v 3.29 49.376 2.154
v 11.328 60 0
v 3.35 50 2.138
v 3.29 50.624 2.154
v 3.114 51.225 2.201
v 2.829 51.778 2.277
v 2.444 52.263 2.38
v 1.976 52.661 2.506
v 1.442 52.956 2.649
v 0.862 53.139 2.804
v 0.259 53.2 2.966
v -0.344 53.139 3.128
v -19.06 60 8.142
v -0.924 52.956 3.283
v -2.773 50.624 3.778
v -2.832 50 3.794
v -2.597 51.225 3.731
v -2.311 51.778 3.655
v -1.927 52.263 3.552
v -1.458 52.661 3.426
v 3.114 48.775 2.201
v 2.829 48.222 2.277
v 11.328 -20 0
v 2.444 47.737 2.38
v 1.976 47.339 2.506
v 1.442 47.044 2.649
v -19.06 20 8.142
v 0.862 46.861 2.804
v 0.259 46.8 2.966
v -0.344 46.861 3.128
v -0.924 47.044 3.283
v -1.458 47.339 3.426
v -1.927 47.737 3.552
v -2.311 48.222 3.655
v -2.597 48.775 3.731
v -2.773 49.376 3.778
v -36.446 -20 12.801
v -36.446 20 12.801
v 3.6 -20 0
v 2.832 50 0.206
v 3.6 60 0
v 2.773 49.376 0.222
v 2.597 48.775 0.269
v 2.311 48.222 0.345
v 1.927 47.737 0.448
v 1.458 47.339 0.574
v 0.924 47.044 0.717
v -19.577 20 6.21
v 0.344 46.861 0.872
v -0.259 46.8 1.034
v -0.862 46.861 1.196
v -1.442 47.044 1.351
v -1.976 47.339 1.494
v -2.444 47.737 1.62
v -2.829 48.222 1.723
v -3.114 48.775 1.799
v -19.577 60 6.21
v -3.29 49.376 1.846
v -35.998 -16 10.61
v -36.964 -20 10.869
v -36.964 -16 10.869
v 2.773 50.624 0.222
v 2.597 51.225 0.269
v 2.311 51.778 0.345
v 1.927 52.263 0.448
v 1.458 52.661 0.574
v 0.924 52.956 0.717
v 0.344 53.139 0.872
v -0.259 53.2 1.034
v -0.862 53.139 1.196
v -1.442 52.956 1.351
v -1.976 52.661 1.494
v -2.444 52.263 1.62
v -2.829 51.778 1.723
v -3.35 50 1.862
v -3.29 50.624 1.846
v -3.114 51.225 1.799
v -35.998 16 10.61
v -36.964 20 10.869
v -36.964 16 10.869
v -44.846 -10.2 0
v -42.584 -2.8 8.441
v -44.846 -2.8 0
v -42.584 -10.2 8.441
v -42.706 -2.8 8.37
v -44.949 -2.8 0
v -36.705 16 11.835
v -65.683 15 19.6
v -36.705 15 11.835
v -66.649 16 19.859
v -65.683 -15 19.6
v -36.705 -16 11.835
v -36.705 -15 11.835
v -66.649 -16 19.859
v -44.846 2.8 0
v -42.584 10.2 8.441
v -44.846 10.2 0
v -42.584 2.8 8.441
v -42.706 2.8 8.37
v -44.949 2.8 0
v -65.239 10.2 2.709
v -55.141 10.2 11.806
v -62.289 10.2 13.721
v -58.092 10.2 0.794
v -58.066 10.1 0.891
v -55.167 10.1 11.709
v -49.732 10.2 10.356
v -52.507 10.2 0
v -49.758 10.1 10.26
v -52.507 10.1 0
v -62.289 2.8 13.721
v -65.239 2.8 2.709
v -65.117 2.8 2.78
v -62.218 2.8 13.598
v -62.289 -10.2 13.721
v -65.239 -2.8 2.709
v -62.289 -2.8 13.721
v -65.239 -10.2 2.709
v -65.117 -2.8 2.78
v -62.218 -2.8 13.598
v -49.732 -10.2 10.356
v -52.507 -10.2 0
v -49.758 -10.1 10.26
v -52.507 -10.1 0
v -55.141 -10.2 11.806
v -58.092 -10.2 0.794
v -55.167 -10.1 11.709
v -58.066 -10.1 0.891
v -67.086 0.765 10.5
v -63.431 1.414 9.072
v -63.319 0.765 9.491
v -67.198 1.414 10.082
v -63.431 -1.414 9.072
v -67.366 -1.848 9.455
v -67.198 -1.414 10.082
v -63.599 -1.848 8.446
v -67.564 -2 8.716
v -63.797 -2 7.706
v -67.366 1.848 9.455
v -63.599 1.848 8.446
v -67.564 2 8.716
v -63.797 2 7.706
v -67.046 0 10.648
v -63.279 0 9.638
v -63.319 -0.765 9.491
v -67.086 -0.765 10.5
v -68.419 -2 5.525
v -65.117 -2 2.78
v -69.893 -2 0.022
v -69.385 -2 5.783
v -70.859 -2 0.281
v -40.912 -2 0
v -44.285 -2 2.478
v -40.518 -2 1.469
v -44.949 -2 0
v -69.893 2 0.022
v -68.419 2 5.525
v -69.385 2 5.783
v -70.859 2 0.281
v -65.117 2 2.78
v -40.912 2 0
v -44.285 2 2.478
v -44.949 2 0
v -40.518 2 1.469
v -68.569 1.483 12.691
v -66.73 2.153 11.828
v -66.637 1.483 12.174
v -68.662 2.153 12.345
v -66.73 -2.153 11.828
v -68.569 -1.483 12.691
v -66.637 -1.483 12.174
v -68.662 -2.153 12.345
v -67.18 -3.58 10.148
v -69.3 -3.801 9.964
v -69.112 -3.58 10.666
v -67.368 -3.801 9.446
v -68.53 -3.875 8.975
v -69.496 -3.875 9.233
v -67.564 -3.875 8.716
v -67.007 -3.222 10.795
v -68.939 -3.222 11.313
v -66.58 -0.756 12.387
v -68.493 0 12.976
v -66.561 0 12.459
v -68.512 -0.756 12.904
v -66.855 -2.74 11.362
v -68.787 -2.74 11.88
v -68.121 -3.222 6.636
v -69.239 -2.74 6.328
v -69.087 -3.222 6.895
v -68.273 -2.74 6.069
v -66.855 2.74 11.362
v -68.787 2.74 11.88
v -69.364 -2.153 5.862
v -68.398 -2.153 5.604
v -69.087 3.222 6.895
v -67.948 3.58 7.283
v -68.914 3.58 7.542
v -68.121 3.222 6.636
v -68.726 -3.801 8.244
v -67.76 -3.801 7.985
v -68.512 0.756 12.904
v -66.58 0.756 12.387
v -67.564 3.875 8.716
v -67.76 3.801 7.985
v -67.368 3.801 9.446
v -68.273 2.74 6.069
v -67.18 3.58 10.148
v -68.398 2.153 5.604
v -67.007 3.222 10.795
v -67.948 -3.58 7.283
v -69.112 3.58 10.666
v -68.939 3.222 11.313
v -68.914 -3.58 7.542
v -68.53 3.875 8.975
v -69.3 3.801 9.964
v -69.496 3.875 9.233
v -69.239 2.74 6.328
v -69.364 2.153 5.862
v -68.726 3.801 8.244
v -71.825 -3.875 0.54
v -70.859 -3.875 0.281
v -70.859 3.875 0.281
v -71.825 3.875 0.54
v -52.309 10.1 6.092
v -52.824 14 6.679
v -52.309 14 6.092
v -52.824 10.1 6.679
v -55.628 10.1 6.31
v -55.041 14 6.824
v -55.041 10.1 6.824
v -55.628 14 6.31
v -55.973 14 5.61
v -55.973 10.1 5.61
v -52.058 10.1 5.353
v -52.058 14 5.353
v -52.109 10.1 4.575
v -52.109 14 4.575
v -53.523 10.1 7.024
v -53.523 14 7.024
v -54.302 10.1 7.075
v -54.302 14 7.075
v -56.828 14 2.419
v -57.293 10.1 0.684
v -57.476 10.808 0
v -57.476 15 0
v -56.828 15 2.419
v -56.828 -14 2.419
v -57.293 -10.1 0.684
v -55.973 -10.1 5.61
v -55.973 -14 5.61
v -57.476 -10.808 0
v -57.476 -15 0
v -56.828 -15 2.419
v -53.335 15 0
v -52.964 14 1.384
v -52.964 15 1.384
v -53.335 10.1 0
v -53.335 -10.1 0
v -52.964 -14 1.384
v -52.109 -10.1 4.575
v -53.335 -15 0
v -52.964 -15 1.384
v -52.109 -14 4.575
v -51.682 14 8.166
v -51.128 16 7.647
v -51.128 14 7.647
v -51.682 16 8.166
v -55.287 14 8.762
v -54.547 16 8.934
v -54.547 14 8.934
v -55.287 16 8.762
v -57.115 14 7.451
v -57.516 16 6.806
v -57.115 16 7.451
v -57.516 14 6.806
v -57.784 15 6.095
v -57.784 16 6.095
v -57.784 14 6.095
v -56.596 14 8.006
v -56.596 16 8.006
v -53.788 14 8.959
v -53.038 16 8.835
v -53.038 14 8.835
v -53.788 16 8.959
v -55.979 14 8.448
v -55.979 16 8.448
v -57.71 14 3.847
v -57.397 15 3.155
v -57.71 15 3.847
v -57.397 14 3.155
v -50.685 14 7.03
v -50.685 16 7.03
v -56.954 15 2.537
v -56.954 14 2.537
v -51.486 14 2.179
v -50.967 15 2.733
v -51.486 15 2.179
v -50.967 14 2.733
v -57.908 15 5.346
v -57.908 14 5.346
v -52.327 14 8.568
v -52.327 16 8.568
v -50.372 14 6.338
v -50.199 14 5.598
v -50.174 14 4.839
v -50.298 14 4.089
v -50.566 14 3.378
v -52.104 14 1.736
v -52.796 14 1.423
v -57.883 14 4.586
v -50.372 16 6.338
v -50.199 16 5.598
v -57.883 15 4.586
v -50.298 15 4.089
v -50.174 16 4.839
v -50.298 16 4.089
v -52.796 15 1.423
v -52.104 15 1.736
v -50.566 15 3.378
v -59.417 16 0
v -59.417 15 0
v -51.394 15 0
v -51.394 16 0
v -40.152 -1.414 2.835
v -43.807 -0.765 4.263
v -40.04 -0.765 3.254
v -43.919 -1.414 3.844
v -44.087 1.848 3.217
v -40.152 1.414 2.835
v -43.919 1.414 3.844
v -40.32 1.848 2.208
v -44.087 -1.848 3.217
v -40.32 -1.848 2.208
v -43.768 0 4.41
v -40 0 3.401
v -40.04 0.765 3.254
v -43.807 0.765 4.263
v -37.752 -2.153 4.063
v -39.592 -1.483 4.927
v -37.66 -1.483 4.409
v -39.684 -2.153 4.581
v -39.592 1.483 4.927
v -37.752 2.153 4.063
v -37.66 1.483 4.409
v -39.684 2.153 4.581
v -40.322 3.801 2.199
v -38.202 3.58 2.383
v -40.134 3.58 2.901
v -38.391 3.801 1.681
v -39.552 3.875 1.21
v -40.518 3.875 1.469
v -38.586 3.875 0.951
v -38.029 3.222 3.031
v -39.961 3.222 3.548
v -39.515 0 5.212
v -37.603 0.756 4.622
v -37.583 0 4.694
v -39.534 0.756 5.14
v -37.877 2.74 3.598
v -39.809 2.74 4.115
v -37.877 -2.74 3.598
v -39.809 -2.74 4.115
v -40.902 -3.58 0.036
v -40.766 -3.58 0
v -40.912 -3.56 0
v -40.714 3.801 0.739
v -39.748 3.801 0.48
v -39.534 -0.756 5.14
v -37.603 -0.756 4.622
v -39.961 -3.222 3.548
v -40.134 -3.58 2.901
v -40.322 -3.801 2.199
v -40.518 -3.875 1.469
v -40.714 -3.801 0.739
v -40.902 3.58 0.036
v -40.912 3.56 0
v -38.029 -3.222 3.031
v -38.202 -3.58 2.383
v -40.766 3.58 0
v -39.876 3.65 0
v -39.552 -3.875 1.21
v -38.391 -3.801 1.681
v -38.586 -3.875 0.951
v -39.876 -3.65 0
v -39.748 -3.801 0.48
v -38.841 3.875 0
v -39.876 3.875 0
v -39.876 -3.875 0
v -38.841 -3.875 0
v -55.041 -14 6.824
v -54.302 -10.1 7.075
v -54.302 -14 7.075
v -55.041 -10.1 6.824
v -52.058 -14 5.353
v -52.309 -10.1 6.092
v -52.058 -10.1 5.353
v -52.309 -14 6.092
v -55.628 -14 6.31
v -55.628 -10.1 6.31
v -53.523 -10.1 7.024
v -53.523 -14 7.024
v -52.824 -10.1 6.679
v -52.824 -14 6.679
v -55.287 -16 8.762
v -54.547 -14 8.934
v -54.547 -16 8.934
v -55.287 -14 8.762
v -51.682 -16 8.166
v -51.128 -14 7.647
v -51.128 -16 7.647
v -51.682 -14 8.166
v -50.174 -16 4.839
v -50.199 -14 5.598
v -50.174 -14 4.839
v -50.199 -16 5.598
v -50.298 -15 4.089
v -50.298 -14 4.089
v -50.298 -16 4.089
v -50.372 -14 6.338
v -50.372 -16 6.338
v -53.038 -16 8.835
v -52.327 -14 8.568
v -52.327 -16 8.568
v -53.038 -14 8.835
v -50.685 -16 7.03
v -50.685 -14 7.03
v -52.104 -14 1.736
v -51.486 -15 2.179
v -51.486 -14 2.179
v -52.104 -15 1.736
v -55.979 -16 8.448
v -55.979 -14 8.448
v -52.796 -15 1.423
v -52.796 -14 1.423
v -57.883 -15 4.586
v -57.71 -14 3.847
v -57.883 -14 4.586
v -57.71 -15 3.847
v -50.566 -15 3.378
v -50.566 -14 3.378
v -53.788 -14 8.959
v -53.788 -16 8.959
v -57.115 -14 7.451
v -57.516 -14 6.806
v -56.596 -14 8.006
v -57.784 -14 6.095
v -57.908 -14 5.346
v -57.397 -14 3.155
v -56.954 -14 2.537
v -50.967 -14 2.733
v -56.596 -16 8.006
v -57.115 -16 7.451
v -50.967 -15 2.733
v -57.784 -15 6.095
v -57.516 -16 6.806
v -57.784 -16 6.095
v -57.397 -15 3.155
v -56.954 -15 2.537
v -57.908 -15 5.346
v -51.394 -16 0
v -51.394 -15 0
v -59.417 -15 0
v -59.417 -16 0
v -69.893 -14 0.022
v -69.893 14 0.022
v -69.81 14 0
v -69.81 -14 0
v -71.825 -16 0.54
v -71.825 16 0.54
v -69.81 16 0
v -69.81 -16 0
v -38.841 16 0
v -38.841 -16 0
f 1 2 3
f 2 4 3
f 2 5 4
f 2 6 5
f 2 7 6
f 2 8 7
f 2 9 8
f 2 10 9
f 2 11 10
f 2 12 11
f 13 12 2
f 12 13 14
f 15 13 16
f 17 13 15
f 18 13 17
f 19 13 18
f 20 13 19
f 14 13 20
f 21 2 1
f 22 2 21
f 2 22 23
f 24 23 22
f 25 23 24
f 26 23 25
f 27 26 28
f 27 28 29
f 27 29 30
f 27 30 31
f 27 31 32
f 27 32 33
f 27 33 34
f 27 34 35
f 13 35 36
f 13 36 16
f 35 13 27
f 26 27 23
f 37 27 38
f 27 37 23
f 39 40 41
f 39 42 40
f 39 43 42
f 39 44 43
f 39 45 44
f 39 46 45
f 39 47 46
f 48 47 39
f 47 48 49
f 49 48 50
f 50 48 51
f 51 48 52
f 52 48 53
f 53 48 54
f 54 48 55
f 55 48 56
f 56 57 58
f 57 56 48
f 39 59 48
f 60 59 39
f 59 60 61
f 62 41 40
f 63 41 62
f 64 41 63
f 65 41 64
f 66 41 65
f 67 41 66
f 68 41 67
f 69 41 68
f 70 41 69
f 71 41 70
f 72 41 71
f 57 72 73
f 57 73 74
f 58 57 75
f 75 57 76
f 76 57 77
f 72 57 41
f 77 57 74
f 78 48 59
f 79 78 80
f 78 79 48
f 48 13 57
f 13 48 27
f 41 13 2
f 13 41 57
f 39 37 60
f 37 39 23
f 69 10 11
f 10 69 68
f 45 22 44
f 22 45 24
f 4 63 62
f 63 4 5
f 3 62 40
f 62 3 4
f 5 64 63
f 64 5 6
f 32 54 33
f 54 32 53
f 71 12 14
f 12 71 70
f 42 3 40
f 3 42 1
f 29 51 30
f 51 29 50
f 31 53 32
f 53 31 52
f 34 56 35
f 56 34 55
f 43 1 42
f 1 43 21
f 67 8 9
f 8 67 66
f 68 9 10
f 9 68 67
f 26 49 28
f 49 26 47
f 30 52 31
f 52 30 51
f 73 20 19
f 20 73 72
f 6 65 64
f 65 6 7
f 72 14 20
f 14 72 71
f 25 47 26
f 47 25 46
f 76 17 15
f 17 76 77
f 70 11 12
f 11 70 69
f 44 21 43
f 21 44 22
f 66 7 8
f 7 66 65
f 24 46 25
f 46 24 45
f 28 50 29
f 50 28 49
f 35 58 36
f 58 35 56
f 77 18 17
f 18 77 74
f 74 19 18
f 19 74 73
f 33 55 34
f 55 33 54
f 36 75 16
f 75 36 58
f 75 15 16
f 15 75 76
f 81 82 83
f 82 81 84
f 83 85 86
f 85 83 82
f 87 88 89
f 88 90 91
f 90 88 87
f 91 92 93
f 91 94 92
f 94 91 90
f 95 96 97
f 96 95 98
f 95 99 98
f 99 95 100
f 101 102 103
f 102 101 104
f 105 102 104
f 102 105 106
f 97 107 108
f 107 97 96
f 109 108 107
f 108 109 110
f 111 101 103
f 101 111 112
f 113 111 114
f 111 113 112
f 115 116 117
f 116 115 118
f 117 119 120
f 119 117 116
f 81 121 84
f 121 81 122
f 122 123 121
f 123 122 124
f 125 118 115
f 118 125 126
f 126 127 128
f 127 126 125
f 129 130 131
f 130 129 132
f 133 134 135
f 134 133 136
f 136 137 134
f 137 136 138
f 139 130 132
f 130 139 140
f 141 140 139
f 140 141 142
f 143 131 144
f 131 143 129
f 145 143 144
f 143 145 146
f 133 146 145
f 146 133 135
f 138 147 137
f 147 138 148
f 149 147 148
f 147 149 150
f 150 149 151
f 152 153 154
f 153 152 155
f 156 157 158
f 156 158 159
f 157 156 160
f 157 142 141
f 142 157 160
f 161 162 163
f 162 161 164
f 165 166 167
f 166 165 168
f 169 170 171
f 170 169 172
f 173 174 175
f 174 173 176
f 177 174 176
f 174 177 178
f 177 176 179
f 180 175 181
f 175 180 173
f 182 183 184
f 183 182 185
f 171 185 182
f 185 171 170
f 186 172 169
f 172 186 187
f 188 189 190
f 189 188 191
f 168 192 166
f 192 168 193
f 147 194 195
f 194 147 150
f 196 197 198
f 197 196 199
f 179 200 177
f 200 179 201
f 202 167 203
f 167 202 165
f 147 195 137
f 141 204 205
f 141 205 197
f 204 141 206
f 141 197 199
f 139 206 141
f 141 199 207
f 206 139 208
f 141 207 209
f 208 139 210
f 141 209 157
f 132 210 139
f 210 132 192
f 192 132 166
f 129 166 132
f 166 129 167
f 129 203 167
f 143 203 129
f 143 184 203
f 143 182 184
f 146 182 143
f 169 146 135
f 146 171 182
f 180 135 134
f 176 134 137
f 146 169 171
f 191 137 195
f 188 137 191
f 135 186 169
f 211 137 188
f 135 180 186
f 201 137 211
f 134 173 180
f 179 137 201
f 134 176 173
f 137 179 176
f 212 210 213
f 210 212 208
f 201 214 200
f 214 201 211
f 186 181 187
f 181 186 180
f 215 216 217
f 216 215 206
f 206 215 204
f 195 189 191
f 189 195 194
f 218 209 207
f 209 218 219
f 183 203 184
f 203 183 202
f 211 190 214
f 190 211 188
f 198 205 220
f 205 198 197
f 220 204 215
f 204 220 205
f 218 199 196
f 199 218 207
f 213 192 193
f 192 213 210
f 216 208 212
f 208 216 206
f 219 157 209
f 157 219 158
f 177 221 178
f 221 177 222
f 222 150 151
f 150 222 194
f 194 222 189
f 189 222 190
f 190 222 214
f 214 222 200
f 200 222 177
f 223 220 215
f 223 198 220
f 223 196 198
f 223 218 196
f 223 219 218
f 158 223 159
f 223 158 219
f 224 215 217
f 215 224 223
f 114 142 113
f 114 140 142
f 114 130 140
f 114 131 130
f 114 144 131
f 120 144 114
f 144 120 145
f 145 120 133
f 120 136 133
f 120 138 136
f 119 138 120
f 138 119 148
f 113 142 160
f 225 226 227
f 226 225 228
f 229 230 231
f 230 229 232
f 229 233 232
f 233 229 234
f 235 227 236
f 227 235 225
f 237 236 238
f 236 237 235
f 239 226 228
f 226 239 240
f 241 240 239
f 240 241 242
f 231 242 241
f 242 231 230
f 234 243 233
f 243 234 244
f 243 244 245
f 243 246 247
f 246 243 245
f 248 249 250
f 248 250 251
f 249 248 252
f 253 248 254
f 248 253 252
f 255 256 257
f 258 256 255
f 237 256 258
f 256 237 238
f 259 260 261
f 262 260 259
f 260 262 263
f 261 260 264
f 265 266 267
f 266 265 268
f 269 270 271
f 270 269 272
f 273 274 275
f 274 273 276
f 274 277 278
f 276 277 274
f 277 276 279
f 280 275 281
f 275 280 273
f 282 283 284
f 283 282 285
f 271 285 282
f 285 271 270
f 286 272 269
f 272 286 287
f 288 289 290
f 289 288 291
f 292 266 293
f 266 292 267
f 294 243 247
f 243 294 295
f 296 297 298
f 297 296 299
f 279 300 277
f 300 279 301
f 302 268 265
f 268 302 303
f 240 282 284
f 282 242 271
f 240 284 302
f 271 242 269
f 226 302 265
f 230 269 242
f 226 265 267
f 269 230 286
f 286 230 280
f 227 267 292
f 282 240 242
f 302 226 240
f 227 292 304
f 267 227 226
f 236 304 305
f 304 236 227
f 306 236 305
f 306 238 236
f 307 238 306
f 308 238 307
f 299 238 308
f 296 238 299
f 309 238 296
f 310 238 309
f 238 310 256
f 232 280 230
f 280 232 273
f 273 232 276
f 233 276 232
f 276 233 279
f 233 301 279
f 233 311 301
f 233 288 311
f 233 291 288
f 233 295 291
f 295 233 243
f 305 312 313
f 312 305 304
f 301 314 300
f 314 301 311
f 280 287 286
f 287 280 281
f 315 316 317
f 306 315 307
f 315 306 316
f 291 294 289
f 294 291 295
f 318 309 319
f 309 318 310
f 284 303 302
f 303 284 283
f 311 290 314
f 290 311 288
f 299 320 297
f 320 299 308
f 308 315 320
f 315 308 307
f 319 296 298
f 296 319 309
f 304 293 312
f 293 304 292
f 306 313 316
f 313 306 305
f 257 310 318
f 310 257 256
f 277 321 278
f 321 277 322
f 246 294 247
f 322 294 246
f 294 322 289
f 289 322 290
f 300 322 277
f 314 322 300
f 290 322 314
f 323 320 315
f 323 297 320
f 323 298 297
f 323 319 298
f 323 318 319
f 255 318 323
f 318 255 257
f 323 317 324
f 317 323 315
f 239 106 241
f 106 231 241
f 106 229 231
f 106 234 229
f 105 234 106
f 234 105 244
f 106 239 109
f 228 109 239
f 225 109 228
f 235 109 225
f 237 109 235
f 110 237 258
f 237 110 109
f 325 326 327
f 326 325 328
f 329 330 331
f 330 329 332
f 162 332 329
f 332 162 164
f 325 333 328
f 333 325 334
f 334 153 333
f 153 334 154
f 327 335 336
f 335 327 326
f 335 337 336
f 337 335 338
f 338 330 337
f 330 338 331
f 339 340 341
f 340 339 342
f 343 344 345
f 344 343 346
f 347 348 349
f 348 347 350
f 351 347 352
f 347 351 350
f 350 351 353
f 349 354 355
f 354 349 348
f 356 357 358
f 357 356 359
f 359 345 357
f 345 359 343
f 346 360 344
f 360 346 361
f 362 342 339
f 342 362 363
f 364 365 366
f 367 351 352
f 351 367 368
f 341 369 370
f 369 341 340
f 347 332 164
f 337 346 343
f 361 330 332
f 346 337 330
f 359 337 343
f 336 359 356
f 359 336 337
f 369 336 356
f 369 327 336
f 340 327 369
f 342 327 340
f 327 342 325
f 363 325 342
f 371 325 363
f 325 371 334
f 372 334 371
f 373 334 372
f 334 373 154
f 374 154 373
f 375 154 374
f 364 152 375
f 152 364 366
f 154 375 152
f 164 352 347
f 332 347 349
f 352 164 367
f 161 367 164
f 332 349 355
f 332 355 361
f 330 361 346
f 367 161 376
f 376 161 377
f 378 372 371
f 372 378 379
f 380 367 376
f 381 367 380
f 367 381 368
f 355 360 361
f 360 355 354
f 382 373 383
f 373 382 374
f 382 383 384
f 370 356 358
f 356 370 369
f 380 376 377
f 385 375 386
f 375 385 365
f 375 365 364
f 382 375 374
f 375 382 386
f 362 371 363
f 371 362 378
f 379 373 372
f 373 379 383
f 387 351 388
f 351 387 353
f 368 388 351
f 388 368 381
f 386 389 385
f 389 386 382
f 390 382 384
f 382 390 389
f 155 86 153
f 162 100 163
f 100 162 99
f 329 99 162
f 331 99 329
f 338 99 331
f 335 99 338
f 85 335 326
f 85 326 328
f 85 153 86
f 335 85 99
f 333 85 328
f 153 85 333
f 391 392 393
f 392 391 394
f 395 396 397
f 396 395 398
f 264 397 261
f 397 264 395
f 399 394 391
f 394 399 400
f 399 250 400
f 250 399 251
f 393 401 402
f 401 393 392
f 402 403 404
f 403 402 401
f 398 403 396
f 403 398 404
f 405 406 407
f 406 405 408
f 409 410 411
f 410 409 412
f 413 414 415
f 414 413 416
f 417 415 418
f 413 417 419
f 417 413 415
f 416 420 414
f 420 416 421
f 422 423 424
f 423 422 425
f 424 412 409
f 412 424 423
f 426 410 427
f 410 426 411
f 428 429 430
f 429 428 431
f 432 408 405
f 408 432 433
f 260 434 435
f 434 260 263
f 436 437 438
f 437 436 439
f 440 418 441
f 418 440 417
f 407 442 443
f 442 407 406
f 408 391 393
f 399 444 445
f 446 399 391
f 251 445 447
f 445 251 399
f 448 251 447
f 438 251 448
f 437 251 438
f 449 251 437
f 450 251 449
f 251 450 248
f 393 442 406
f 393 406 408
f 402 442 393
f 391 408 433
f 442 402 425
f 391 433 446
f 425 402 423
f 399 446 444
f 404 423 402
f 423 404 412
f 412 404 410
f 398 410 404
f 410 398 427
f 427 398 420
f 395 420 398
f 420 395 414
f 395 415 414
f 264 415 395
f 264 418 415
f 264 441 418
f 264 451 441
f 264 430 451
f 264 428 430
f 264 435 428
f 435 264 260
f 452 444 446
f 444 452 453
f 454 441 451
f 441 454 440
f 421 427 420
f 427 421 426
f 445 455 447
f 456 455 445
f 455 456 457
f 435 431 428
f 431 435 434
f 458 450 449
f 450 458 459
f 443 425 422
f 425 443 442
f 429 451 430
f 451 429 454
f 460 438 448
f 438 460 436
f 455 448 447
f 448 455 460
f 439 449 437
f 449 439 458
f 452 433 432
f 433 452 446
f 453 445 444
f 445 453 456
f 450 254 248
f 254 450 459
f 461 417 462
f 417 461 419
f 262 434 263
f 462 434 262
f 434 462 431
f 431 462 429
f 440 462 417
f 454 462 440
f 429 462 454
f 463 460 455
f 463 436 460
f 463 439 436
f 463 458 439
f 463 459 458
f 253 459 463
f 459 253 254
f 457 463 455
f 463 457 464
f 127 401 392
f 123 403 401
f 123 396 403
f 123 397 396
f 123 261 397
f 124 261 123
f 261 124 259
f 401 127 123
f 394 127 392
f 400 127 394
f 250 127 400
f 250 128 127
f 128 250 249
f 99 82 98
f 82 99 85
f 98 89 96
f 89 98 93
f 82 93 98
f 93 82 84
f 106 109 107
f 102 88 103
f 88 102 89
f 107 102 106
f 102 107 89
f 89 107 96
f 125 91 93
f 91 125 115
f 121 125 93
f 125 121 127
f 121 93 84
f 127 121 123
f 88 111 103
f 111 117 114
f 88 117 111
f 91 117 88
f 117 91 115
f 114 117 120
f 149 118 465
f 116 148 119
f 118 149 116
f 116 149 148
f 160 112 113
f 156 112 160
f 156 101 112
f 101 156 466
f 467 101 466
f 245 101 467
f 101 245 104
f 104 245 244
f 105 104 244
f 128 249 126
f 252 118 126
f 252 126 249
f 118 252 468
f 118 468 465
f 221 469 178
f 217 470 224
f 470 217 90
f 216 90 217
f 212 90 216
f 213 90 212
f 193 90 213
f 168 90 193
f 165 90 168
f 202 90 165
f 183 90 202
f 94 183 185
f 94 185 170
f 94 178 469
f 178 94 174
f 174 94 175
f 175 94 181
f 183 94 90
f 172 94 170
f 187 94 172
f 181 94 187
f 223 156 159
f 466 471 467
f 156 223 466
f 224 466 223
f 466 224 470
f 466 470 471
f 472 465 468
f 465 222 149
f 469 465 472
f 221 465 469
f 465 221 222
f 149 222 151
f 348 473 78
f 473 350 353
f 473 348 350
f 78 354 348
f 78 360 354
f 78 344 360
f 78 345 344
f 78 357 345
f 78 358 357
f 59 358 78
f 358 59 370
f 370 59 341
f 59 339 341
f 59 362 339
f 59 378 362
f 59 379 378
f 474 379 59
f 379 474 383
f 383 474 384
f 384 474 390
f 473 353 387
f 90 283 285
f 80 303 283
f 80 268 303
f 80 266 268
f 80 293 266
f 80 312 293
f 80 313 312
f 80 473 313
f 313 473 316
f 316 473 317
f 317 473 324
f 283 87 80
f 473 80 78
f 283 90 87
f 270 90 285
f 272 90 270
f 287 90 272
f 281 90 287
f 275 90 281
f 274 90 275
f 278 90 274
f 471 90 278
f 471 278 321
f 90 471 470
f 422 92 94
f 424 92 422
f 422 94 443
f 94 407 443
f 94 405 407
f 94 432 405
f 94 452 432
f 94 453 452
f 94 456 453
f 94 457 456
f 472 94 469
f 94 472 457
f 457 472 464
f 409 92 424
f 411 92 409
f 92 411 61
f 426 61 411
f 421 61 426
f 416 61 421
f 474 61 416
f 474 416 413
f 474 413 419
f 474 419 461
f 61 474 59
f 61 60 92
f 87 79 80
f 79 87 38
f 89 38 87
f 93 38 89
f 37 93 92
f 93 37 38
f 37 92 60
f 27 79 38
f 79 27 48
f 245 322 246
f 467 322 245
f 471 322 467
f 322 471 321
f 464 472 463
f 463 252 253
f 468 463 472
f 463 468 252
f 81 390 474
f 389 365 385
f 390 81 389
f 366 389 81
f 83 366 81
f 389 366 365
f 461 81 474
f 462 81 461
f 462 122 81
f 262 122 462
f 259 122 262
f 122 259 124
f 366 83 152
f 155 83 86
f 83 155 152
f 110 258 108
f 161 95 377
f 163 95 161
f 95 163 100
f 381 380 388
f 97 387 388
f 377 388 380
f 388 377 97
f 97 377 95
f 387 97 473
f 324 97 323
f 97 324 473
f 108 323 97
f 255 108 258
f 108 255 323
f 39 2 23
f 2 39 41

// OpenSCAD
// Generated by SolidPython 1.1.3 on 2024-01-15 18:45:57


difference() {
	translate(v = [0, 0, 2]) {
		rotate(a = 15, v = [0, 1, 0]) {
			union() {
				difference() {
					translate(v = [0, 20.0000000000, 0]) {
						cube(center = true, size = [40, 80, 2]);
					}
					translate(v = [0, 50, 0]) {
						cylinder($fn = 32, center = true, h = 20, r = 3.2000000000);
					}
				}
				union() {
					translate(v = [-53, 0, -10]) {
						rotate(a = 90, v = [0, 1, 0]) {
							difference() {
								union() {
									union();
									translate(v = [-10, 0, 0]) {
										rotate(a = [0, 90.0, 0.0]) {
											translate(v = [0, 0, 10.0]) {
												cube(center = true, size = [32.0000000000, 32.0000000000, 20.0]);
											}
										}
									}
									union();
								}
								union() {
									union();
									translate(v = [-10, 0, 0]) {
										rotate(a = [0, 90.0, 0.0]) {
											translate(v = [0, 0, 10]) {
												rotate(a = -90, v = [0, -1, 0]) {
													rotate(a = 90, v = [0, 0, 1]) {
														union() {
															union();
															translate(v = [0, -10, 0]) {
																rotate(a = -90, v = [1, 0, 0]) {
																	polyhedron(convexity = 10, faces = [[0, 1, 4], [1, 5, 4], [1, 2, 5], [2, 6, 5], [2, 3, 6], [3, 7, 6], [3, 0, 7], [0, 4, 7], [3, 2, 1, 0], [4, 5, 6, 7]], points = [[-15.0000000000, 15.0000000000, 0.0000000000], [15.0000000000, 15.0000000000, 0.0000000000], [15.0000000000, -15.0000000000, 0.0000000000], [-15.0000000000, -15.0000000000, 0.0000000000], [0.0000000000, 0.0000000000, 15.0000000000], [0.0000000000, 0.0000000000, 15.0000000000], [0.0000000000, 0.0000000000, 15.0000000000], [0.0000000000, 0.0000000000, 15.0000000000]]);
																}
															}
															translate(v = [0, 1.0, 0]) {
																rotate(a = 180, v = [1, 0, 0]) {
																	translate(v = [0, -10, 0]) {
																		rotate(a = -90, v = [1, 0, 0]) {
																			polyhedron(convexity = 10, faces = [[0, 1, 4], [1, 5, 4], [1, 2, 5], [2, 6, 5], [2, 3, 6], [3, 7, 6], [3, 0, 7], [0, 4, 7], [3, 2, 1, 0], [4, 5, 6, 7]], points = [[-15.0000000000, 15.0000000000, 0.0000000000], [15.0000000000, 15.0000000000, 0.0000000000], [15.0000000000, -15.0000000000, 0.0000000000], [-15.0000000000, -15.0000000000, 0.0000000000], [0.0000000000, 0.0000000000, 15.0000000000], [0.0000000000, 0.0000000000, 15.0000000000], [0.0000000000, 0.0000000000, 15.0000000000], [0.0000000000, 0.0000000000, 15.0000000000]]);
																		}
																	}
																}
															}
															translate(v = [0, -10, 0]) {
																rotate(a = -90, v = [1, 0, 0]) {
																	union() {
																		polyhedron(convexity = 10, faces = [[0, 1, 5], [1, 6, 5], [1, 2, 6], [2, 7, 6], [2, 3, 7], [3, 8, 7], [3, 4, 8], [4, 9, 8], [4, 0, 9], [0, 5, 9], [4, 3, 2, 1, 0], [5, 6, 7, 8, 9]], points = [[-10.2, 10.2, 0.0], [-10.2, 2.8, 0.0], [-4.3999999999999995, 2.8, 0.0], [-4.3999999999999995, 0.0, 0.0], [0.0, 0.0, 0.0], [-10.2, 10.2, 20.0], [-10.2, 2.8, 20.0], [-4.3999999999999995, 2.8, 20.0], [-4.3999999999999995, 0.0, 20.0], [0.0, 0.0, 20.0]]);
																		mirror(v = [0, 1]) {
																			polyhedron(convexity = 10, faces = [[0, 1, 5], [1, 6, 5], [1, 2, 6], [2, 7, 6], [2, 3, 7], [3, 8, 7], [3, 4, 8], [4, 9, 8], [4, 0, 9], [0, 5, 9], [4, 3, 2, 1, 0], [5, 6, 7, 8, 9]], points = [[-10.2, 10.2, 0.0], [-10.2, 2.8, 0.0], [-4.3999999999999995, 2.8, 0.0], [-4.3999999999999995, 0.0, 0.0], [0.0, 0.0, 0.0], [-10.2, 10.2, 20.0], [-10.2, 2.8, 20.0], [-4.3999999999999995, 2.8, 20.0], [-4.3999999999999995, 0.0, 20.0], [0.0, 0.0, 20.0]]);
																		}
																		mirror(v = [1, 1]) {
																			union() {
																				polyhedron(convexity = 10, faces = [[0, 1, 5], [1, 6, 5], [1, 2, 6], [2, 7, 6], [2, 3, 7], [3, 8, 7], [3, 4, 8], [4, 9, 8], [4, 0, 9], [0, 5, 9], [4, 3, 2, 1, 0], [5, 6, 7, 8, 9]], points = [[-10.2, 10.2, 0.0], [-10.2, 2.8, 0.0], [-4.3999999999999995, 2.8, 0.0], [-4.3999999999999995, 0.0, 0.0], [0.0, 0.0, 0.0], [-10.2, 10.2, 20.0], [-10.2, 2.8, 20.0], [-4.3999999999999995, 2.8, 20.0], [-4.3999999999999995, 0.0, 20.0], [0.0, 0.0, 20.0]]);
																				mirror(v = [0, 1]) {
																					polyhedron(convexity = 10, faces = [[0, 1, 5], [1, 6, 5], [1, 2, 6], [2, 7, 6], [2, 3, 7], [3, 8, 7], [3, 4, 8], [4, 9, 8], [4, 0, 9], [0, 5, 9], [4, 3, 2, 1, 0], [5, 6, 7, 8, 9]], points = [[-10.2, 10.2, 0.0], [-10.2, 2.8, 0.0], [-4.3999999999999995, 2.8, 0.0], [-4.3999999999999995, 0.0, 0.0], [0.0, 0.0, 0.0], [-10.2, 10.2, 20.0], [-10.2, 2.8, 20.0], [-4.3999999999999995, 2.8, 20.0], [-4.3999999999999995, 0.0, 20.0], [0.0, 0.0, 20.0]]);
																				}
																			}
																		}
																		mirror(v = [1, -1]) {
																			union() {
																				polyhedron(convexity = 10, faces = [[0, 1, 5], [1, 6, 5], [1, 2, 6], [2, 7, 6], [2, 3, 7], [3, 8, 7], [3, 4, 8], [4, 9, 8], [4, 0, 9], [0, 5, 9], [4, 3, 2, 1, 0], [5, 6, 7, 8, 9]], points = [[-10.2, 10.2, 0.0], [-10.2, 2.8, 0.0], [-4.3999999999999995, 2.8, 0.0], [-4.3999999999999995, 0.0, 0.0], [0.0, 0.0, 0.0], [-10.2, 10.2, 20.0], [-10.2, 2.8, 20.0], [-4.3999999999999995, 2.8, 20.0], [-4.3999999999999995, 0.0, 20.0], [0.0, 0.0, 20.0]]);
																				mirror(v = [0, 1]) {
																					polyhedron(convexity = 10, faces = [[0, 1, 5], [1, 6, 5], [1, 2, 6], [2, 7, 6], [2, 3, 7], [3, 8, 7], [3, 4, 8], [4, 9, 8], [4, 0, 9], [0, 5, 9], [4, 3, 2, 1, 0], [5, 6, 7, 8, 9]], points = [[-10.2, 10.2, 0.0], [-10.2, 2.8, 0.0], [-4.3999999999999995, 2.8, 0.0], [-4.3999999999999995, 0.0, 0.0], [0.0, 0.0, 0.0], [-10.2, 10.2, 20.0], [-10.2, 2.8, 20.0], [-4.3999999999999995, 2.8, 20.0], [-4.3999999999999995, 0.0, 20.0], [0.0, 0.0, 20.0]]);
																				}
																				mirror(v = [1, 1]) {
																					union() {
																						polyhedron(convexity = 10, faces = [[0, 1, 5], [1, 6, 5], [1, 2, 6], [2, 7, 6], [2, 3, 7], [3, 8, 7], [3, 4, 8], [4, 9, 8], [4, 0, 9], [0, 5, 9], [4, 3, 2, 1, 0], [5, 6, 7, 8, 9]], points = [[-10.2, 10.2, 0.0], [-10.2, 2.8, 0.0], [-4.3999999999999995, 2.8, 0.0], [-4.3999999999999995, 0.0, 0.0], [0.0, 0.0, 0.0], [-10.2, 10.2, 20.0], [-10.2, 2.8, 20.0], [-4.3999999999999995, 2.8, 20.0], [-4.3999999999999995, 0.0, 20.0], [0.0, 0.0, 20.0]]);
																						mirror(v = [0, 1]) {
																							polyhedron(convexity = 10, faces = [[0, 1, 5], [1, 6, 5], [1, 2, 6], [2, 7, 6], [2, 3, 7], [3, 8, 7], [3, 4, 8], [4, 9, 8], [4, 0, 9], [0, 5, 9], [4, 3, 2, 1, 0], [5, 6, 7, 8, 9]], points = [[-10.2, 10.2, 0.0], [-10.2, 2.8, 0.0], [-4.3999999999999995, 2.8, 0.0], [-4.3999999999999995, 0.0, 0.0], [0.0, 0.0, 0.0], [-10.2, 10.2, 20.0], [-10.2, 2.8, 20.0], [-4.3999999999999995, 2.8, 20.0], [-4.3999999999999995, 0.0, 20.0], [0.0, 0.0, 20.0]]);
																						}
																					}
																				}
																			}
																		}
																	}
																}
															}
															union() {
																union();
																translate(v = [0, 1.0, 0]) {
																	rotate(a = 180, v = [1, 0, 0]) {
																		rotate(a = 180, v = [0, 1, 0]) {
																			union() {
																				translate(v = [0, 0, 14]) {
																					cylinder($fn = 32, h = 4, r = 3.8750000000);
																				}
																				translate(v = [-3.8750000000, -12, 15]) {
																					cube(size = [7.7500000000, 12, 4]);
																				}
																				union() {
																					cylinder($fn = 16, h = 19, r = 2.0000000000);
																					translate(v = [-2.0000000000, -12, 0]) {
																						cube(size = [4, 12, 19]);
																					}
																				}
																				rotate(a = -90, v = [0, 1, 0]) {
																					polyhedron(convexity = 10, faces = [[0, 1, 3], [1, 4, 3], [1, 2, 4], [2, 5, 4], [2, 0, 5], [0, 3, 5], [2, 1, 0], [3, 4, 5]], points = [[0.0000000000, -10.0000000000, 0.0000000000], [10.1000000000, -10.0000000000, 10.1000000000], [10.1000000000, -10.0000000000, -10.1000000000], [0.0000000000, 12.0000000000, 0.0000000000], [10.1000000000, 12.0000000000, 10.1000000000], [10.1000000000, 12.0000000000, -10.1000000000]]);
																				}
																			}
																		}
																	}
																}
																translate(v = [0, 1.0, 0]) {
																	rotate(a = 180, v = [1, 0, 0]) {
																		rotate(a = 90, v = [0, 1, 0]) {
																			union() {
																				translate(v = [0, 0, 14]) {
																					cylinder($fn = 32, h = 4, r = 3.8750000000);
																				}
																				translate(v = [-3.8750000000, -12, 15]) {
																					cube(size = [7.7500000000, 12, 4]);
																				}
																				union() {
																					cylinder($fn = 16, h = 19, r = 2.0000000000);
																					translate(v = [-2.0000000000, -12, 0]) {
																						cube(size = [4, 12, 19]);
																					}
																				}
																				rotate(a = -90, v = [0, 1, 0]) {
																					polyhedron(convexity = 10, faces = [[0, 1, 3], [1, 4, 3], [1, 2, 4], [2, 5, 4], [2, 0, 5], [0, 3, 5], [2, 1, 0], [3, 4, 5]], points = [[0.0000000000, -10.0000000000, 0.0000000000], [10.1000000000, -10.0000000000, 10.1000000000], [10.1000000000, -10.0000000000, -10.1000000000], [0.0000000000, 12.0000000000, 0.0000000000], [10.1000000000, 12.0000000000, 10.1000000000], [10.1000000000, 12.0000000000, -10.1000000000]]);
																				}
																			}
																		}
																	}
																}
																translate(v = [0, 1.0, 0]) {
																	rotate(a = 180, v = [1, 0, 0]) {
																		union() {
																			translate(v = [0, 0, 14]) {
																				cylinder($fn = 32, h = 4, r = 3.8750000000);
																			}
																			translate(v = [-3.8750000000, -12, 15]) {
																				cube(size = [7.7500000000, 12, 4]);
																			}
																			union() {
																				cylinder($fn = 16, h = 19, r = 2.0000000000);
																				translate(v = [-2.0000000000, -12, 0]) {
																					cube(size = [4, 12, 19]);
																				}
																			}
																			rotate(a = -90, v = [0, 1, 0]) {
																				polyhedron(convexity = 10, faces = [[0, 1, 3], [1, 4, 3], [1, 2, 4], [2, 5, 4], [2, 0, 5], [0, 3, 5], [2, 1, 0], [3, 4, 5]], points = [[0.0000000000, -10.0000000000, 0.0000000000], [10.1000000000, -10.0000000000, 10.1000000000], [10.1000000000, -10.0000000000, -10.1000000000], [0.0000000000, 12.0000000000, 0.0000000000], [10.1000000000, 12.0000000000, 10.1000000000], [10.1000000000, 12.0000000000, -10.1000000000]]);
																			}
																		}
																	}
																}
																translate(v = [0, 1.0, 0]) {
																	rotate(a = 180, v = [1, 0, 0]) {
																		rotate(a = 270, v = [0, 1, 0]) {
																			union() {
																				translate(v = [0, 0, 14]) {
																					cylinder($fn = 32, h = 4, r = 3.8750000000);
																				}
																				translate(v = [-3.8750000000, -12, 15]) {
																					cube(size = [7.7500000000, 12, 4]);
																				}
																				union() {
																					cylinder($fn = 16, h = 19, r = 2.0000000000);
																					translate(v = [-2.0000000000, -12, 0]) {
																						cube(size = [4, 12, 19]);
																					}
																				}
																				rotate(a = -90, v = [0, 1, 0]) {
																					polyhedron(convexity = 10, faces = [[0, 1, 3], [1, 4, 3], [1, 2, 4], [2, 5, 4], [2, 0, 5], [0, 3, 5], [2, 1, 0], [3, 4, 5]], points = [[0.0000000000, -10.0000000000, 0.0000000000], [10.1000000000, -10.0000000000, 10.1000000000], [10.1000000000, -10.0000000000, -10.1000000000], [0.0000000000, 12.0000000000, 0.0000000000], [10.1000000000, 12.0000000000, 10.1000000000], [10.1000000000, 12.0000000000, -10.1000000000]]);
																				}
																			}
																		}
																	}
																}
															}
														}
													}
												}
											}
										}
									}
								}
							}
						}
					}
					translate(v = [-28.0000000000, 0, 0]) {
						cube(center = true, size = [20, 40, 2]);
					}
				}
			}
		}
	}
	translate(v = [0, 0, -150]) {
		cube(center = true, size = [300, 300, 300]);
	}
}
/***********************************************
*********      SolidPython code:      **********
************************************************
 
#! /usr/bin/env python3
import sys
from math import cos, radians, sin, pi, tau
from pathlib import Path

from solid import *
from solid.utils import *

from typing import Set, Sequence, List, Callable, Optional, Union, Iterable, Tuple

import numpy as np

import extrusion_fittings as ef

class CameraMount():
	def __init__(self,camera_size = 40,screw_dia = 6.4, mount_thick = 2):
		self.camera_size = camera_size
		self.screw_dia = screw_dia
		self.mount_thick = mount_thick

	def screws(self) -> OpenSCADObject:
		screw = cylinder(r=self.screw_dia/2, h=20, segments = 32, center=True)
		screw = translate([0,50,0])(screw)
		return screw

	def camera_mount(self) -> OpenSCADObject:
		mm = cube([self.camera_size,self.camera_size*2,self.mount_thick], center=True)
		mm = translate([0,self.camera_size/2,0])(mm)
		mm -= self.screws()
		return mm

	def offset_block(self) -> OpenSCADObject:
		ob = cube([20,self.camera_size,self.mount_thick],center=True)
		ob = translate([-self.camera_size/2-8,0,0])(ob)
		return ob

	def bisect_floor(self,input) -> OpenSCADObject:
		size = 300
		floor = translate([0,0,-150])(cube([300,300,300],center = True))
		return input - floor


if __name__ == "__main__":
	out_dir = sys.argv[1] if len(sys.argv) > 1 else Path(__file__).parent

	e = ef.Fittings(10)
	m = CameraMount()
	a = m.camera_mount()
	t = e.one_end_tube()
	t = rotate(a = 90,v = (0,1,0))(t)
	t = translate([-53,0,-10])(t)
	b = m.offset_block()
	a += t + b
	a = rotate(a = 15, v = (0,1,0))(a)
	a = translate([0,0,2])(a)
	a = m.bisect_floor(a)

	file_out = scad_render_to_file(a,  out_dir=out_dir, include_orig_code=True)
	print(f"{__file__}: SCAD file written to: \n{file_out}")
 
 
************************************************/
